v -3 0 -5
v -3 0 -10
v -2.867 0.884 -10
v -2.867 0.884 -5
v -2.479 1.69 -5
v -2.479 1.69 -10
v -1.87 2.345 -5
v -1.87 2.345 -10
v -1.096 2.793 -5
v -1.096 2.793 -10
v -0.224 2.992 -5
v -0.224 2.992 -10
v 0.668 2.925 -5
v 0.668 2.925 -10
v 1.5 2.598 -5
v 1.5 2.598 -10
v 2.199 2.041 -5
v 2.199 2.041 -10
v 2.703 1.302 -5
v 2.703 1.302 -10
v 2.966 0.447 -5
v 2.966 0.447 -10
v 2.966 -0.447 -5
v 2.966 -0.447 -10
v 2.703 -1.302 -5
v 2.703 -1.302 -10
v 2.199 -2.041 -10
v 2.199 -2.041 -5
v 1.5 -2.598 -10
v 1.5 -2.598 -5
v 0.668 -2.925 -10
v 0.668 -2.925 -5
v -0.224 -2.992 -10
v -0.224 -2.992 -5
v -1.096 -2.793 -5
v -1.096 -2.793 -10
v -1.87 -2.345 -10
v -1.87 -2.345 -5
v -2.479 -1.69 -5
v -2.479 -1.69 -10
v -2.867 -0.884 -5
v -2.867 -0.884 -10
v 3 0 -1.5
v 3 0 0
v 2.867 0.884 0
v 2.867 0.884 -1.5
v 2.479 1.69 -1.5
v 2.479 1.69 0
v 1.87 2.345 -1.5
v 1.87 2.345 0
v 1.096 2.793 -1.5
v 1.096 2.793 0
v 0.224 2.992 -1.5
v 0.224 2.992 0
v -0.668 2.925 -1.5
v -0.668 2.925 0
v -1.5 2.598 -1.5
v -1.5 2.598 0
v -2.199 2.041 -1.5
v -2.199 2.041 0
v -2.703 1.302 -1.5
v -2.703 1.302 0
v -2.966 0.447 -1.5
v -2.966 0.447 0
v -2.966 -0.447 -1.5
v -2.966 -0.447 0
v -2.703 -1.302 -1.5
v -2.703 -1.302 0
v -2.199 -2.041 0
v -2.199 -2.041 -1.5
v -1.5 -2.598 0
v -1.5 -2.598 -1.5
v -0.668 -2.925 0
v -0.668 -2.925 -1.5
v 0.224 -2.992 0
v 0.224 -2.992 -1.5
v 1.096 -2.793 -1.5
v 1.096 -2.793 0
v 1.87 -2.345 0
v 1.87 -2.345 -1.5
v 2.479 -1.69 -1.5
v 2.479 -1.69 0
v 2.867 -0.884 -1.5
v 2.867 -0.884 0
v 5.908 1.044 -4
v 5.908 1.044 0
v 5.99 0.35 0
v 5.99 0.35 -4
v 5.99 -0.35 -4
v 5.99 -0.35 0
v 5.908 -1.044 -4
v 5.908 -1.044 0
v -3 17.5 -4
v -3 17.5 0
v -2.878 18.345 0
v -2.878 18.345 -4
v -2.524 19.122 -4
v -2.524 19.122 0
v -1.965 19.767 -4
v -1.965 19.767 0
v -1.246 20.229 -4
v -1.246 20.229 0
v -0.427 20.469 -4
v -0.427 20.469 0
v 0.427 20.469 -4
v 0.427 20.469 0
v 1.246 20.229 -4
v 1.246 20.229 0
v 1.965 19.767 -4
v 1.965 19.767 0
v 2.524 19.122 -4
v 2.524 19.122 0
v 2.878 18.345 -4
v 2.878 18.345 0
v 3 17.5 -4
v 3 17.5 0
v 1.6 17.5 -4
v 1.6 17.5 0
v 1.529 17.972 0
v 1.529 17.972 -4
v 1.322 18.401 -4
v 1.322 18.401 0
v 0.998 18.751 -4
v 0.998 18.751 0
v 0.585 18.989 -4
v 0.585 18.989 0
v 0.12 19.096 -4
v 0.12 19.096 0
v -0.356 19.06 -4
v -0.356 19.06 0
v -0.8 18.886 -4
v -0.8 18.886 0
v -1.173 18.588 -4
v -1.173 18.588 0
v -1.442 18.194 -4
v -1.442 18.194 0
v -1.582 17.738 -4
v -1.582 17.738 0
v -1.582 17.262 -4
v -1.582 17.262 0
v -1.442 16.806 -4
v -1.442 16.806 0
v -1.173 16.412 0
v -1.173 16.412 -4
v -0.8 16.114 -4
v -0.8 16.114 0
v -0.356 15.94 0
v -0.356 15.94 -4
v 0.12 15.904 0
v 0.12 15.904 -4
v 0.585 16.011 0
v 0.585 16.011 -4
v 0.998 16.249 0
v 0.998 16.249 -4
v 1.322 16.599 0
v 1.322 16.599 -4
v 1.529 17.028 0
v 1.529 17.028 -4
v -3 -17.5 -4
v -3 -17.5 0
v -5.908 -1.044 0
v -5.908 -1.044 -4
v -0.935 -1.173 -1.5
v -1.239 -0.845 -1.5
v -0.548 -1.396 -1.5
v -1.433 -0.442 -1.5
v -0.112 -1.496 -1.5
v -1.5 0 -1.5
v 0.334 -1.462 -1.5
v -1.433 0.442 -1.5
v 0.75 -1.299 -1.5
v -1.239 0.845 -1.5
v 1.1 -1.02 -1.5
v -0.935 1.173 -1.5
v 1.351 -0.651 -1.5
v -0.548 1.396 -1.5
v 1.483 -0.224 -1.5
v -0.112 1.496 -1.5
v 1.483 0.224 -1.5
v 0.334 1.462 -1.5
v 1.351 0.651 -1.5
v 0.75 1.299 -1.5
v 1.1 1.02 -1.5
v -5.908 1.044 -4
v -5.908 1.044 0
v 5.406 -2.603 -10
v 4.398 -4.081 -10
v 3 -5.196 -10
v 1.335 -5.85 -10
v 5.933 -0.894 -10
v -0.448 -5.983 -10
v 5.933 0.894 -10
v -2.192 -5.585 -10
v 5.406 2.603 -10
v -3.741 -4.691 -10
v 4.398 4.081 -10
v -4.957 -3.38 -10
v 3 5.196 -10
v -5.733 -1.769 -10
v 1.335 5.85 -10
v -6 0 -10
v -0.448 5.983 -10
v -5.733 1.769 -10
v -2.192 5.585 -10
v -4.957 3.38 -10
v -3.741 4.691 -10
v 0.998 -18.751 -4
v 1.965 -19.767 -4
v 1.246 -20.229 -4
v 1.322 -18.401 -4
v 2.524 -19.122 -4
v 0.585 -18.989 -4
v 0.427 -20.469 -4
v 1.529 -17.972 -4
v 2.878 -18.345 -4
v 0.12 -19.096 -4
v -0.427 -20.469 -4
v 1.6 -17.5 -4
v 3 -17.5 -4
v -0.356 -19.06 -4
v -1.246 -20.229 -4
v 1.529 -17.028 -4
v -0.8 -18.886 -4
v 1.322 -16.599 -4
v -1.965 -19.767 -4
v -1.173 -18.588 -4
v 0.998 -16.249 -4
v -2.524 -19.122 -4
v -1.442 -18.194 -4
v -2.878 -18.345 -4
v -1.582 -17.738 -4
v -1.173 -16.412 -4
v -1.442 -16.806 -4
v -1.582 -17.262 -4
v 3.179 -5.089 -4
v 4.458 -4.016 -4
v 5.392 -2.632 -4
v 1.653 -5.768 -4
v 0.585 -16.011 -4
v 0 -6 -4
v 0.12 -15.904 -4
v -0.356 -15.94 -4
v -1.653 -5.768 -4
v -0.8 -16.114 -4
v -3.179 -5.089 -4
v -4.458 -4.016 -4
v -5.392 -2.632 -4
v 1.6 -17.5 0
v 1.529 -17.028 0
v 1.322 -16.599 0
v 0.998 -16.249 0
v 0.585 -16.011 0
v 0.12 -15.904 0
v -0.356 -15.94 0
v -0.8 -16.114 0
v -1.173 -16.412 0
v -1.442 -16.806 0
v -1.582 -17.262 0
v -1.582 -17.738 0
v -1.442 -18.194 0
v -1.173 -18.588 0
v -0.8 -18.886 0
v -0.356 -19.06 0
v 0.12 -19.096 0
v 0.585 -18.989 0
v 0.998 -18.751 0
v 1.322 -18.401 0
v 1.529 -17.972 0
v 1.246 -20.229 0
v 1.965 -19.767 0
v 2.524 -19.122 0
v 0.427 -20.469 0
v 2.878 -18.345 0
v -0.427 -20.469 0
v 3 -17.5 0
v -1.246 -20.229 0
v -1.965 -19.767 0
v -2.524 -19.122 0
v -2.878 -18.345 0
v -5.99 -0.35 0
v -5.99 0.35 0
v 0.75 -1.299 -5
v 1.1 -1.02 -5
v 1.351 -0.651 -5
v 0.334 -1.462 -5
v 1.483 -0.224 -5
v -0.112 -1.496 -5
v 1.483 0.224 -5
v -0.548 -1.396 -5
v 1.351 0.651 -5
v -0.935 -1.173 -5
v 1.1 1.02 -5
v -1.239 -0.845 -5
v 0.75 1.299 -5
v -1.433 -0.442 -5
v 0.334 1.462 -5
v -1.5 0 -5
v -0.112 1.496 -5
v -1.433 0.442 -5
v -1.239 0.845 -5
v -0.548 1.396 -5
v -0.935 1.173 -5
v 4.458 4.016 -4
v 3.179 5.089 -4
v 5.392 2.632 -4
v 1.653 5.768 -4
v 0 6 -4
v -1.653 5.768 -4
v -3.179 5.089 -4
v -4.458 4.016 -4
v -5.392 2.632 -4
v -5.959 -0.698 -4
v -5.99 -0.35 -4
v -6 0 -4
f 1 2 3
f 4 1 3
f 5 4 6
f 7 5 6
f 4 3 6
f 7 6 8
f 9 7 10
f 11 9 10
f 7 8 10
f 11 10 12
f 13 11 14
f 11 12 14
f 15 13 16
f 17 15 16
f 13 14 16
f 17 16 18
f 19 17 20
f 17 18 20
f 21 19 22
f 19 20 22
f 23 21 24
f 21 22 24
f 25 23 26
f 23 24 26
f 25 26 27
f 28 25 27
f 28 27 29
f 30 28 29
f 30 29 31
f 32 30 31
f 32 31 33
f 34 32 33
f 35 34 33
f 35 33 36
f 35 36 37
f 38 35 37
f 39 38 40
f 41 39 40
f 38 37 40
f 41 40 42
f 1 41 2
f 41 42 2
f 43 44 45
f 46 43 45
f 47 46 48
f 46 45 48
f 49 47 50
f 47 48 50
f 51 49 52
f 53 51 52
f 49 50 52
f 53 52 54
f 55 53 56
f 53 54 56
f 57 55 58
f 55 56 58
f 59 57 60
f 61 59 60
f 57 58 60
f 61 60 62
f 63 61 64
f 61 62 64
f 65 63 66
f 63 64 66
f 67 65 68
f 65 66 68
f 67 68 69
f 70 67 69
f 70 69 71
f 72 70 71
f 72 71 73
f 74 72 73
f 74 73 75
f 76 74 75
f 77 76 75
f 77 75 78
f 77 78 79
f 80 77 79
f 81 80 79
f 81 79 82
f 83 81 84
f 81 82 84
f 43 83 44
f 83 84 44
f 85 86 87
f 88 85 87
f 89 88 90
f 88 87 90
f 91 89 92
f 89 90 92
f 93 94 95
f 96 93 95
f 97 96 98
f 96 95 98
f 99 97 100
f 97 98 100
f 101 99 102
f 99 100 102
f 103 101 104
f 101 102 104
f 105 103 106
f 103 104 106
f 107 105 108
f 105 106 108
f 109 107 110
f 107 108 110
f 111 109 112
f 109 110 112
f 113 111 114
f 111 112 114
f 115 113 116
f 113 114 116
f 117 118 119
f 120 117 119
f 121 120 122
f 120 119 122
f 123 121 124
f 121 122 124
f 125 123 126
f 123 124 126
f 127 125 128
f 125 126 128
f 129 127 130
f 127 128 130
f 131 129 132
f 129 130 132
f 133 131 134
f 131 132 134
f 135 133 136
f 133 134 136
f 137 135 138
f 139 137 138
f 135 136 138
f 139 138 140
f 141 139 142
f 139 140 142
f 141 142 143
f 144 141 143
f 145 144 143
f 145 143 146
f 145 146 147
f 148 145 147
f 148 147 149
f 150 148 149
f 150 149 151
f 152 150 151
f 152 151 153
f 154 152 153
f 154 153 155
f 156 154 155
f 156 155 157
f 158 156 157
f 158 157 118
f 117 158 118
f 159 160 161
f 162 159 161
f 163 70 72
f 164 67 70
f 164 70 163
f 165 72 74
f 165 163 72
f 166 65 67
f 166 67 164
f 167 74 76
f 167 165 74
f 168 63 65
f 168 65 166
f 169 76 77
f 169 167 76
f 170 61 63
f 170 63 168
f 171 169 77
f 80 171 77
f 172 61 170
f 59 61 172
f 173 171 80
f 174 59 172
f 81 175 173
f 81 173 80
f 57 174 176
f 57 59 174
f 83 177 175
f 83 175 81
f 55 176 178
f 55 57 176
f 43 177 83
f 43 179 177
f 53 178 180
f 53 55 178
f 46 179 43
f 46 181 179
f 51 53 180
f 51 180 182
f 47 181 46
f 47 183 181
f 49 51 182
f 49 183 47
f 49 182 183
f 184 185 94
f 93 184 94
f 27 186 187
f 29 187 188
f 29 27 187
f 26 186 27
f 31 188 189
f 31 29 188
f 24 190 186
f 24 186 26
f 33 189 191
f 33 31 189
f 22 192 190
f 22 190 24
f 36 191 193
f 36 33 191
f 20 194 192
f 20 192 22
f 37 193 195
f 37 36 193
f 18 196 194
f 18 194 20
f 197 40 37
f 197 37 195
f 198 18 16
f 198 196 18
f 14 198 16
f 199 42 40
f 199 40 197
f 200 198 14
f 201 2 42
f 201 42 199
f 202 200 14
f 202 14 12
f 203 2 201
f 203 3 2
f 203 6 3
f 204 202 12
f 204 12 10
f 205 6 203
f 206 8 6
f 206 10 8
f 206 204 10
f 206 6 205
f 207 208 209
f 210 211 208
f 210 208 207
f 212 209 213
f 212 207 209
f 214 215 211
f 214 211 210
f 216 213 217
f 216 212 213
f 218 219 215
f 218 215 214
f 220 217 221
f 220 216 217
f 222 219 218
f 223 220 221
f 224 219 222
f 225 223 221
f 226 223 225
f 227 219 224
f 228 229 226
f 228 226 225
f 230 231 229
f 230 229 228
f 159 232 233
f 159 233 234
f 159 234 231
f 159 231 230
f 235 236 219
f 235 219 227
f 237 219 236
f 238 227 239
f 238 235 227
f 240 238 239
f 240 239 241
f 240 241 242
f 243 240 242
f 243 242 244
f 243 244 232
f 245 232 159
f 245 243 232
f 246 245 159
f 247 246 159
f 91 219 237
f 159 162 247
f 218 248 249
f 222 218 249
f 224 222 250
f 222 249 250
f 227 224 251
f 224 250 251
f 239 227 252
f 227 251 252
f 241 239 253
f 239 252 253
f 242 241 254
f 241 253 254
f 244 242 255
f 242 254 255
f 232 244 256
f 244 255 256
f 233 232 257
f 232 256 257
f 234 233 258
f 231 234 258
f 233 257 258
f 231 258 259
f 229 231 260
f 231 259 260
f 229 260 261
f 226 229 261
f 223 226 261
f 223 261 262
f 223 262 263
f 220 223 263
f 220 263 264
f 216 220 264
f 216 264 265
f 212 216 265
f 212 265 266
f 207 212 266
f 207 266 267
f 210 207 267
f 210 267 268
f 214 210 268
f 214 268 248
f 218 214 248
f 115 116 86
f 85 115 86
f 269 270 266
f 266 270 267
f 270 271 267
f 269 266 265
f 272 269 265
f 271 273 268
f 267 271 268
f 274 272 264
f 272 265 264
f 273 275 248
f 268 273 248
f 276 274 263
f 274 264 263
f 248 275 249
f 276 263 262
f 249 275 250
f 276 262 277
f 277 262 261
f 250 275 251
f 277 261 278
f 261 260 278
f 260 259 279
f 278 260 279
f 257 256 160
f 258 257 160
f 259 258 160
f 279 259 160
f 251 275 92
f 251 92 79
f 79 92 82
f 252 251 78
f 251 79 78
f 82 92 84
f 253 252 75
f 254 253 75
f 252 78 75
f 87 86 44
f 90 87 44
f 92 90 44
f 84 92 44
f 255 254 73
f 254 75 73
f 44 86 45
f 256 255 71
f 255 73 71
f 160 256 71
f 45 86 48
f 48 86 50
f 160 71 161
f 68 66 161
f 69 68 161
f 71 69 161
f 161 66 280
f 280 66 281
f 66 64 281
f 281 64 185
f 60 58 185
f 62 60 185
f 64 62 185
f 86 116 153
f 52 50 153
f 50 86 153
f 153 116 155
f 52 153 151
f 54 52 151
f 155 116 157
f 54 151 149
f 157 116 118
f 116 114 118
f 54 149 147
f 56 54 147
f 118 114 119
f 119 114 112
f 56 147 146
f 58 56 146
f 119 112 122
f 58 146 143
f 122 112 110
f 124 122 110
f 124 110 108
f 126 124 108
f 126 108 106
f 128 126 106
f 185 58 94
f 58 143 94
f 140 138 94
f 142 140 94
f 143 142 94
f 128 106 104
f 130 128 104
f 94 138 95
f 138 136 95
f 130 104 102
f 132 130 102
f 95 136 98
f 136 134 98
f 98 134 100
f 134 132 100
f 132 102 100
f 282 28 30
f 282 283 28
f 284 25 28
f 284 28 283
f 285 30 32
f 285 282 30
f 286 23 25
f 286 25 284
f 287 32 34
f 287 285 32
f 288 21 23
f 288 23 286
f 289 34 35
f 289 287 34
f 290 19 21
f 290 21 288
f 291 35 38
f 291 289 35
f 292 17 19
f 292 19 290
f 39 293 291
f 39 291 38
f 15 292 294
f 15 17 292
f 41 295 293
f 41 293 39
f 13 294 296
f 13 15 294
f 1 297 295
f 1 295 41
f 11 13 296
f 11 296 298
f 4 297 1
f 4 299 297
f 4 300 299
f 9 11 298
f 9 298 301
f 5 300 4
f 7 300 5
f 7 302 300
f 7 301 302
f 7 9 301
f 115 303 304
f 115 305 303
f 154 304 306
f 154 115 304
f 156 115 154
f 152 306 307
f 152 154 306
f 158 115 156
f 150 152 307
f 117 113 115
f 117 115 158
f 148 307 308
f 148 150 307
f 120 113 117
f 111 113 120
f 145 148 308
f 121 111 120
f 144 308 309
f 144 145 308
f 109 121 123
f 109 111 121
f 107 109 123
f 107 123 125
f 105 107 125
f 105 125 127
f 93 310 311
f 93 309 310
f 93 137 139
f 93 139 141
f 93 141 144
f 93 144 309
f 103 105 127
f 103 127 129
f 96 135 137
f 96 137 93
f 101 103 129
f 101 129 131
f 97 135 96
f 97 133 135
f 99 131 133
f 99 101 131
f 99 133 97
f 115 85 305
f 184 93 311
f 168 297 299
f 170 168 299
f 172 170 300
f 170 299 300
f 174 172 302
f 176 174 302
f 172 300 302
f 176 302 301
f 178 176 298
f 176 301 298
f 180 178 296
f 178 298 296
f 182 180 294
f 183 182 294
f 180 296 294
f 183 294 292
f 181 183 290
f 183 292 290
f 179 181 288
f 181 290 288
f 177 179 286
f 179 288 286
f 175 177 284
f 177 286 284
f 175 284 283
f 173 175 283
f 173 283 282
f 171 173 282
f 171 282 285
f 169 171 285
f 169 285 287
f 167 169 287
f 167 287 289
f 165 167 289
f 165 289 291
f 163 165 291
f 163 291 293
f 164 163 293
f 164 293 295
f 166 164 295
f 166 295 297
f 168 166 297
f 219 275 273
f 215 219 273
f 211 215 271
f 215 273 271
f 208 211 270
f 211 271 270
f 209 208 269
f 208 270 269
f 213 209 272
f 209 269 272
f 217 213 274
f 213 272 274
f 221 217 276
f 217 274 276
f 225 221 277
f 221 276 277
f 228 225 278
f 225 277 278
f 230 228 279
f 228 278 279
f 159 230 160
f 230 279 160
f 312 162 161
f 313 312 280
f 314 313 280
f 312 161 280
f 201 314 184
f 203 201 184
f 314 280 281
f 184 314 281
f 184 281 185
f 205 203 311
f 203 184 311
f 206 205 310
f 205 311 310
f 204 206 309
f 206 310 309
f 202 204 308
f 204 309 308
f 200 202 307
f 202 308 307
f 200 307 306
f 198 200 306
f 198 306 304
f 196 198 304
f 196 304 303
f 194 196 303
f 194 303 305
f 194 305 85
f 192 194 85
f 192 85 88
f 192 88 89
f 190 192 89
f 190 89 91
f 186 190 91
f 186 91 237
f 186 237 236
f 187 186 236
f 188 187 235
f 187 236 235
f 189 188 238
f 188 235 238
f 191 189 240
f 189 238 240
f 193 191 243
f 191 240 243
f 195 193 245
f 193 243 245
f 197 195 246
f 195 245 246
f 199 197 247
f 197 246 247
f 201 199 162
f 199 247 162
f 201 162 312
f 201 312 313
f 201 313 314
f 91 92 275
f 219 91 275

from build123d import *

# Parameters (mm, degrees)
BOSS_EXTRUDE1_DEPTH = 4
SKETCH5_R           = 6
BOSS_EXTRUDE3_DEPTH = 6
SKETCH6_R           = 3
CUT_EXTRUDE1_DEPTH  = 5
SKETCH7_R           = 1.5
CUT_EXTRUDE2_DEPTH  = 6
SKETCH4_R           = 1.6
CUT_EXTRUDE3_DEPTH  = 11
SKETCH8_R           = 3
CUT_EXTRUDE4_DEPTH  = 1.5


with BuildPart() as part:
    # Sketch1 → Boss-Extrude1 (new body)
    with BuildSketch(Plane.XY):
        with BuildLine():
            Line((3, 17.5), (5.908426238, 1.044269788))
            ThreePointArc((5.908426238, 1.044269788), (6, 0), (5.908426238, -1.044269788))
            Line((5.908426238, -1.044269788), (3, -17.5))
            ThreePointArc((3, -17.5), (0, -20.5), (-3, -17.5))
            Line((-3, -17.5), (-5.908426238, -1.044269788))
            ThreePointArc((-5.908426238, -1.044269788), (-6, 0), (-5.908426238, 1.044269788))
            Line((-5.908426238, 1.044269788), (-3, 17.5))
            ThreePointArc((-3, 17.5), (0, 20.5), (3, 17.5))
        make_face()
    extrude(amount=-BOSS_EXTRUDE1_DEPTH)

    # Sketch5 → Boss-Extrude3 (add)
    with BuildSketch(Plane(origin=(0, 0, -4), x_dir=(-1, 0, 0), z_dir=(0, 0, -1))):
        Circle(SKETCH5_R)
    extrude(amount=BOSS_EXTRUDE3_DEPTH)

    # Sketch6 → Cut-Extrude1 (cut)
    with BuildSketch(Plane(origin=(0, 0, -10), x_dir=(-1, 0, 0), z_dir=(0, 0, -1))):
        Circle(SKETCH6_R)
    extrude(amount=-CUT_EXTRUDE1_DEPTH, mode=Mode.SUBTRACT)

    # Sketch7 → Cut-Extrude2 (cut, through all)
    with BuildSketch(Plane(origin=(0, 0, -5), x_dir=(-1, 0, 0), z_dir=(0, 0, -1))):
        Circle(SKETCH7_R)
    extrude(amount=-CUT_EXTRUDE2_DEPTH, mode=Mode.SUBTRACT)

    # Sketch4 → Cut-Extrude3 (cut, through all)
    with BuildSketch(Plane.XY):
        with Locations((0, 17.5)):
            Circle(SKETCH4_R)
        with Locations((0, -17.5)):
            Circle(SKETCH4_R)
    extrude(amount=-CUT_EXTRUDE3_DEPTH, mode=Mode.SUBTRACT)

    # Sketch8 → Cut-Extrude4 (cut)
    with BuildSketch(Plane.XY):
        Circle(SKETCH8_R)
    extrude(amount=-CUT_EXTRUDE4_DEPTH, mode=Mode.SUBTRACT)


solid = part.part
